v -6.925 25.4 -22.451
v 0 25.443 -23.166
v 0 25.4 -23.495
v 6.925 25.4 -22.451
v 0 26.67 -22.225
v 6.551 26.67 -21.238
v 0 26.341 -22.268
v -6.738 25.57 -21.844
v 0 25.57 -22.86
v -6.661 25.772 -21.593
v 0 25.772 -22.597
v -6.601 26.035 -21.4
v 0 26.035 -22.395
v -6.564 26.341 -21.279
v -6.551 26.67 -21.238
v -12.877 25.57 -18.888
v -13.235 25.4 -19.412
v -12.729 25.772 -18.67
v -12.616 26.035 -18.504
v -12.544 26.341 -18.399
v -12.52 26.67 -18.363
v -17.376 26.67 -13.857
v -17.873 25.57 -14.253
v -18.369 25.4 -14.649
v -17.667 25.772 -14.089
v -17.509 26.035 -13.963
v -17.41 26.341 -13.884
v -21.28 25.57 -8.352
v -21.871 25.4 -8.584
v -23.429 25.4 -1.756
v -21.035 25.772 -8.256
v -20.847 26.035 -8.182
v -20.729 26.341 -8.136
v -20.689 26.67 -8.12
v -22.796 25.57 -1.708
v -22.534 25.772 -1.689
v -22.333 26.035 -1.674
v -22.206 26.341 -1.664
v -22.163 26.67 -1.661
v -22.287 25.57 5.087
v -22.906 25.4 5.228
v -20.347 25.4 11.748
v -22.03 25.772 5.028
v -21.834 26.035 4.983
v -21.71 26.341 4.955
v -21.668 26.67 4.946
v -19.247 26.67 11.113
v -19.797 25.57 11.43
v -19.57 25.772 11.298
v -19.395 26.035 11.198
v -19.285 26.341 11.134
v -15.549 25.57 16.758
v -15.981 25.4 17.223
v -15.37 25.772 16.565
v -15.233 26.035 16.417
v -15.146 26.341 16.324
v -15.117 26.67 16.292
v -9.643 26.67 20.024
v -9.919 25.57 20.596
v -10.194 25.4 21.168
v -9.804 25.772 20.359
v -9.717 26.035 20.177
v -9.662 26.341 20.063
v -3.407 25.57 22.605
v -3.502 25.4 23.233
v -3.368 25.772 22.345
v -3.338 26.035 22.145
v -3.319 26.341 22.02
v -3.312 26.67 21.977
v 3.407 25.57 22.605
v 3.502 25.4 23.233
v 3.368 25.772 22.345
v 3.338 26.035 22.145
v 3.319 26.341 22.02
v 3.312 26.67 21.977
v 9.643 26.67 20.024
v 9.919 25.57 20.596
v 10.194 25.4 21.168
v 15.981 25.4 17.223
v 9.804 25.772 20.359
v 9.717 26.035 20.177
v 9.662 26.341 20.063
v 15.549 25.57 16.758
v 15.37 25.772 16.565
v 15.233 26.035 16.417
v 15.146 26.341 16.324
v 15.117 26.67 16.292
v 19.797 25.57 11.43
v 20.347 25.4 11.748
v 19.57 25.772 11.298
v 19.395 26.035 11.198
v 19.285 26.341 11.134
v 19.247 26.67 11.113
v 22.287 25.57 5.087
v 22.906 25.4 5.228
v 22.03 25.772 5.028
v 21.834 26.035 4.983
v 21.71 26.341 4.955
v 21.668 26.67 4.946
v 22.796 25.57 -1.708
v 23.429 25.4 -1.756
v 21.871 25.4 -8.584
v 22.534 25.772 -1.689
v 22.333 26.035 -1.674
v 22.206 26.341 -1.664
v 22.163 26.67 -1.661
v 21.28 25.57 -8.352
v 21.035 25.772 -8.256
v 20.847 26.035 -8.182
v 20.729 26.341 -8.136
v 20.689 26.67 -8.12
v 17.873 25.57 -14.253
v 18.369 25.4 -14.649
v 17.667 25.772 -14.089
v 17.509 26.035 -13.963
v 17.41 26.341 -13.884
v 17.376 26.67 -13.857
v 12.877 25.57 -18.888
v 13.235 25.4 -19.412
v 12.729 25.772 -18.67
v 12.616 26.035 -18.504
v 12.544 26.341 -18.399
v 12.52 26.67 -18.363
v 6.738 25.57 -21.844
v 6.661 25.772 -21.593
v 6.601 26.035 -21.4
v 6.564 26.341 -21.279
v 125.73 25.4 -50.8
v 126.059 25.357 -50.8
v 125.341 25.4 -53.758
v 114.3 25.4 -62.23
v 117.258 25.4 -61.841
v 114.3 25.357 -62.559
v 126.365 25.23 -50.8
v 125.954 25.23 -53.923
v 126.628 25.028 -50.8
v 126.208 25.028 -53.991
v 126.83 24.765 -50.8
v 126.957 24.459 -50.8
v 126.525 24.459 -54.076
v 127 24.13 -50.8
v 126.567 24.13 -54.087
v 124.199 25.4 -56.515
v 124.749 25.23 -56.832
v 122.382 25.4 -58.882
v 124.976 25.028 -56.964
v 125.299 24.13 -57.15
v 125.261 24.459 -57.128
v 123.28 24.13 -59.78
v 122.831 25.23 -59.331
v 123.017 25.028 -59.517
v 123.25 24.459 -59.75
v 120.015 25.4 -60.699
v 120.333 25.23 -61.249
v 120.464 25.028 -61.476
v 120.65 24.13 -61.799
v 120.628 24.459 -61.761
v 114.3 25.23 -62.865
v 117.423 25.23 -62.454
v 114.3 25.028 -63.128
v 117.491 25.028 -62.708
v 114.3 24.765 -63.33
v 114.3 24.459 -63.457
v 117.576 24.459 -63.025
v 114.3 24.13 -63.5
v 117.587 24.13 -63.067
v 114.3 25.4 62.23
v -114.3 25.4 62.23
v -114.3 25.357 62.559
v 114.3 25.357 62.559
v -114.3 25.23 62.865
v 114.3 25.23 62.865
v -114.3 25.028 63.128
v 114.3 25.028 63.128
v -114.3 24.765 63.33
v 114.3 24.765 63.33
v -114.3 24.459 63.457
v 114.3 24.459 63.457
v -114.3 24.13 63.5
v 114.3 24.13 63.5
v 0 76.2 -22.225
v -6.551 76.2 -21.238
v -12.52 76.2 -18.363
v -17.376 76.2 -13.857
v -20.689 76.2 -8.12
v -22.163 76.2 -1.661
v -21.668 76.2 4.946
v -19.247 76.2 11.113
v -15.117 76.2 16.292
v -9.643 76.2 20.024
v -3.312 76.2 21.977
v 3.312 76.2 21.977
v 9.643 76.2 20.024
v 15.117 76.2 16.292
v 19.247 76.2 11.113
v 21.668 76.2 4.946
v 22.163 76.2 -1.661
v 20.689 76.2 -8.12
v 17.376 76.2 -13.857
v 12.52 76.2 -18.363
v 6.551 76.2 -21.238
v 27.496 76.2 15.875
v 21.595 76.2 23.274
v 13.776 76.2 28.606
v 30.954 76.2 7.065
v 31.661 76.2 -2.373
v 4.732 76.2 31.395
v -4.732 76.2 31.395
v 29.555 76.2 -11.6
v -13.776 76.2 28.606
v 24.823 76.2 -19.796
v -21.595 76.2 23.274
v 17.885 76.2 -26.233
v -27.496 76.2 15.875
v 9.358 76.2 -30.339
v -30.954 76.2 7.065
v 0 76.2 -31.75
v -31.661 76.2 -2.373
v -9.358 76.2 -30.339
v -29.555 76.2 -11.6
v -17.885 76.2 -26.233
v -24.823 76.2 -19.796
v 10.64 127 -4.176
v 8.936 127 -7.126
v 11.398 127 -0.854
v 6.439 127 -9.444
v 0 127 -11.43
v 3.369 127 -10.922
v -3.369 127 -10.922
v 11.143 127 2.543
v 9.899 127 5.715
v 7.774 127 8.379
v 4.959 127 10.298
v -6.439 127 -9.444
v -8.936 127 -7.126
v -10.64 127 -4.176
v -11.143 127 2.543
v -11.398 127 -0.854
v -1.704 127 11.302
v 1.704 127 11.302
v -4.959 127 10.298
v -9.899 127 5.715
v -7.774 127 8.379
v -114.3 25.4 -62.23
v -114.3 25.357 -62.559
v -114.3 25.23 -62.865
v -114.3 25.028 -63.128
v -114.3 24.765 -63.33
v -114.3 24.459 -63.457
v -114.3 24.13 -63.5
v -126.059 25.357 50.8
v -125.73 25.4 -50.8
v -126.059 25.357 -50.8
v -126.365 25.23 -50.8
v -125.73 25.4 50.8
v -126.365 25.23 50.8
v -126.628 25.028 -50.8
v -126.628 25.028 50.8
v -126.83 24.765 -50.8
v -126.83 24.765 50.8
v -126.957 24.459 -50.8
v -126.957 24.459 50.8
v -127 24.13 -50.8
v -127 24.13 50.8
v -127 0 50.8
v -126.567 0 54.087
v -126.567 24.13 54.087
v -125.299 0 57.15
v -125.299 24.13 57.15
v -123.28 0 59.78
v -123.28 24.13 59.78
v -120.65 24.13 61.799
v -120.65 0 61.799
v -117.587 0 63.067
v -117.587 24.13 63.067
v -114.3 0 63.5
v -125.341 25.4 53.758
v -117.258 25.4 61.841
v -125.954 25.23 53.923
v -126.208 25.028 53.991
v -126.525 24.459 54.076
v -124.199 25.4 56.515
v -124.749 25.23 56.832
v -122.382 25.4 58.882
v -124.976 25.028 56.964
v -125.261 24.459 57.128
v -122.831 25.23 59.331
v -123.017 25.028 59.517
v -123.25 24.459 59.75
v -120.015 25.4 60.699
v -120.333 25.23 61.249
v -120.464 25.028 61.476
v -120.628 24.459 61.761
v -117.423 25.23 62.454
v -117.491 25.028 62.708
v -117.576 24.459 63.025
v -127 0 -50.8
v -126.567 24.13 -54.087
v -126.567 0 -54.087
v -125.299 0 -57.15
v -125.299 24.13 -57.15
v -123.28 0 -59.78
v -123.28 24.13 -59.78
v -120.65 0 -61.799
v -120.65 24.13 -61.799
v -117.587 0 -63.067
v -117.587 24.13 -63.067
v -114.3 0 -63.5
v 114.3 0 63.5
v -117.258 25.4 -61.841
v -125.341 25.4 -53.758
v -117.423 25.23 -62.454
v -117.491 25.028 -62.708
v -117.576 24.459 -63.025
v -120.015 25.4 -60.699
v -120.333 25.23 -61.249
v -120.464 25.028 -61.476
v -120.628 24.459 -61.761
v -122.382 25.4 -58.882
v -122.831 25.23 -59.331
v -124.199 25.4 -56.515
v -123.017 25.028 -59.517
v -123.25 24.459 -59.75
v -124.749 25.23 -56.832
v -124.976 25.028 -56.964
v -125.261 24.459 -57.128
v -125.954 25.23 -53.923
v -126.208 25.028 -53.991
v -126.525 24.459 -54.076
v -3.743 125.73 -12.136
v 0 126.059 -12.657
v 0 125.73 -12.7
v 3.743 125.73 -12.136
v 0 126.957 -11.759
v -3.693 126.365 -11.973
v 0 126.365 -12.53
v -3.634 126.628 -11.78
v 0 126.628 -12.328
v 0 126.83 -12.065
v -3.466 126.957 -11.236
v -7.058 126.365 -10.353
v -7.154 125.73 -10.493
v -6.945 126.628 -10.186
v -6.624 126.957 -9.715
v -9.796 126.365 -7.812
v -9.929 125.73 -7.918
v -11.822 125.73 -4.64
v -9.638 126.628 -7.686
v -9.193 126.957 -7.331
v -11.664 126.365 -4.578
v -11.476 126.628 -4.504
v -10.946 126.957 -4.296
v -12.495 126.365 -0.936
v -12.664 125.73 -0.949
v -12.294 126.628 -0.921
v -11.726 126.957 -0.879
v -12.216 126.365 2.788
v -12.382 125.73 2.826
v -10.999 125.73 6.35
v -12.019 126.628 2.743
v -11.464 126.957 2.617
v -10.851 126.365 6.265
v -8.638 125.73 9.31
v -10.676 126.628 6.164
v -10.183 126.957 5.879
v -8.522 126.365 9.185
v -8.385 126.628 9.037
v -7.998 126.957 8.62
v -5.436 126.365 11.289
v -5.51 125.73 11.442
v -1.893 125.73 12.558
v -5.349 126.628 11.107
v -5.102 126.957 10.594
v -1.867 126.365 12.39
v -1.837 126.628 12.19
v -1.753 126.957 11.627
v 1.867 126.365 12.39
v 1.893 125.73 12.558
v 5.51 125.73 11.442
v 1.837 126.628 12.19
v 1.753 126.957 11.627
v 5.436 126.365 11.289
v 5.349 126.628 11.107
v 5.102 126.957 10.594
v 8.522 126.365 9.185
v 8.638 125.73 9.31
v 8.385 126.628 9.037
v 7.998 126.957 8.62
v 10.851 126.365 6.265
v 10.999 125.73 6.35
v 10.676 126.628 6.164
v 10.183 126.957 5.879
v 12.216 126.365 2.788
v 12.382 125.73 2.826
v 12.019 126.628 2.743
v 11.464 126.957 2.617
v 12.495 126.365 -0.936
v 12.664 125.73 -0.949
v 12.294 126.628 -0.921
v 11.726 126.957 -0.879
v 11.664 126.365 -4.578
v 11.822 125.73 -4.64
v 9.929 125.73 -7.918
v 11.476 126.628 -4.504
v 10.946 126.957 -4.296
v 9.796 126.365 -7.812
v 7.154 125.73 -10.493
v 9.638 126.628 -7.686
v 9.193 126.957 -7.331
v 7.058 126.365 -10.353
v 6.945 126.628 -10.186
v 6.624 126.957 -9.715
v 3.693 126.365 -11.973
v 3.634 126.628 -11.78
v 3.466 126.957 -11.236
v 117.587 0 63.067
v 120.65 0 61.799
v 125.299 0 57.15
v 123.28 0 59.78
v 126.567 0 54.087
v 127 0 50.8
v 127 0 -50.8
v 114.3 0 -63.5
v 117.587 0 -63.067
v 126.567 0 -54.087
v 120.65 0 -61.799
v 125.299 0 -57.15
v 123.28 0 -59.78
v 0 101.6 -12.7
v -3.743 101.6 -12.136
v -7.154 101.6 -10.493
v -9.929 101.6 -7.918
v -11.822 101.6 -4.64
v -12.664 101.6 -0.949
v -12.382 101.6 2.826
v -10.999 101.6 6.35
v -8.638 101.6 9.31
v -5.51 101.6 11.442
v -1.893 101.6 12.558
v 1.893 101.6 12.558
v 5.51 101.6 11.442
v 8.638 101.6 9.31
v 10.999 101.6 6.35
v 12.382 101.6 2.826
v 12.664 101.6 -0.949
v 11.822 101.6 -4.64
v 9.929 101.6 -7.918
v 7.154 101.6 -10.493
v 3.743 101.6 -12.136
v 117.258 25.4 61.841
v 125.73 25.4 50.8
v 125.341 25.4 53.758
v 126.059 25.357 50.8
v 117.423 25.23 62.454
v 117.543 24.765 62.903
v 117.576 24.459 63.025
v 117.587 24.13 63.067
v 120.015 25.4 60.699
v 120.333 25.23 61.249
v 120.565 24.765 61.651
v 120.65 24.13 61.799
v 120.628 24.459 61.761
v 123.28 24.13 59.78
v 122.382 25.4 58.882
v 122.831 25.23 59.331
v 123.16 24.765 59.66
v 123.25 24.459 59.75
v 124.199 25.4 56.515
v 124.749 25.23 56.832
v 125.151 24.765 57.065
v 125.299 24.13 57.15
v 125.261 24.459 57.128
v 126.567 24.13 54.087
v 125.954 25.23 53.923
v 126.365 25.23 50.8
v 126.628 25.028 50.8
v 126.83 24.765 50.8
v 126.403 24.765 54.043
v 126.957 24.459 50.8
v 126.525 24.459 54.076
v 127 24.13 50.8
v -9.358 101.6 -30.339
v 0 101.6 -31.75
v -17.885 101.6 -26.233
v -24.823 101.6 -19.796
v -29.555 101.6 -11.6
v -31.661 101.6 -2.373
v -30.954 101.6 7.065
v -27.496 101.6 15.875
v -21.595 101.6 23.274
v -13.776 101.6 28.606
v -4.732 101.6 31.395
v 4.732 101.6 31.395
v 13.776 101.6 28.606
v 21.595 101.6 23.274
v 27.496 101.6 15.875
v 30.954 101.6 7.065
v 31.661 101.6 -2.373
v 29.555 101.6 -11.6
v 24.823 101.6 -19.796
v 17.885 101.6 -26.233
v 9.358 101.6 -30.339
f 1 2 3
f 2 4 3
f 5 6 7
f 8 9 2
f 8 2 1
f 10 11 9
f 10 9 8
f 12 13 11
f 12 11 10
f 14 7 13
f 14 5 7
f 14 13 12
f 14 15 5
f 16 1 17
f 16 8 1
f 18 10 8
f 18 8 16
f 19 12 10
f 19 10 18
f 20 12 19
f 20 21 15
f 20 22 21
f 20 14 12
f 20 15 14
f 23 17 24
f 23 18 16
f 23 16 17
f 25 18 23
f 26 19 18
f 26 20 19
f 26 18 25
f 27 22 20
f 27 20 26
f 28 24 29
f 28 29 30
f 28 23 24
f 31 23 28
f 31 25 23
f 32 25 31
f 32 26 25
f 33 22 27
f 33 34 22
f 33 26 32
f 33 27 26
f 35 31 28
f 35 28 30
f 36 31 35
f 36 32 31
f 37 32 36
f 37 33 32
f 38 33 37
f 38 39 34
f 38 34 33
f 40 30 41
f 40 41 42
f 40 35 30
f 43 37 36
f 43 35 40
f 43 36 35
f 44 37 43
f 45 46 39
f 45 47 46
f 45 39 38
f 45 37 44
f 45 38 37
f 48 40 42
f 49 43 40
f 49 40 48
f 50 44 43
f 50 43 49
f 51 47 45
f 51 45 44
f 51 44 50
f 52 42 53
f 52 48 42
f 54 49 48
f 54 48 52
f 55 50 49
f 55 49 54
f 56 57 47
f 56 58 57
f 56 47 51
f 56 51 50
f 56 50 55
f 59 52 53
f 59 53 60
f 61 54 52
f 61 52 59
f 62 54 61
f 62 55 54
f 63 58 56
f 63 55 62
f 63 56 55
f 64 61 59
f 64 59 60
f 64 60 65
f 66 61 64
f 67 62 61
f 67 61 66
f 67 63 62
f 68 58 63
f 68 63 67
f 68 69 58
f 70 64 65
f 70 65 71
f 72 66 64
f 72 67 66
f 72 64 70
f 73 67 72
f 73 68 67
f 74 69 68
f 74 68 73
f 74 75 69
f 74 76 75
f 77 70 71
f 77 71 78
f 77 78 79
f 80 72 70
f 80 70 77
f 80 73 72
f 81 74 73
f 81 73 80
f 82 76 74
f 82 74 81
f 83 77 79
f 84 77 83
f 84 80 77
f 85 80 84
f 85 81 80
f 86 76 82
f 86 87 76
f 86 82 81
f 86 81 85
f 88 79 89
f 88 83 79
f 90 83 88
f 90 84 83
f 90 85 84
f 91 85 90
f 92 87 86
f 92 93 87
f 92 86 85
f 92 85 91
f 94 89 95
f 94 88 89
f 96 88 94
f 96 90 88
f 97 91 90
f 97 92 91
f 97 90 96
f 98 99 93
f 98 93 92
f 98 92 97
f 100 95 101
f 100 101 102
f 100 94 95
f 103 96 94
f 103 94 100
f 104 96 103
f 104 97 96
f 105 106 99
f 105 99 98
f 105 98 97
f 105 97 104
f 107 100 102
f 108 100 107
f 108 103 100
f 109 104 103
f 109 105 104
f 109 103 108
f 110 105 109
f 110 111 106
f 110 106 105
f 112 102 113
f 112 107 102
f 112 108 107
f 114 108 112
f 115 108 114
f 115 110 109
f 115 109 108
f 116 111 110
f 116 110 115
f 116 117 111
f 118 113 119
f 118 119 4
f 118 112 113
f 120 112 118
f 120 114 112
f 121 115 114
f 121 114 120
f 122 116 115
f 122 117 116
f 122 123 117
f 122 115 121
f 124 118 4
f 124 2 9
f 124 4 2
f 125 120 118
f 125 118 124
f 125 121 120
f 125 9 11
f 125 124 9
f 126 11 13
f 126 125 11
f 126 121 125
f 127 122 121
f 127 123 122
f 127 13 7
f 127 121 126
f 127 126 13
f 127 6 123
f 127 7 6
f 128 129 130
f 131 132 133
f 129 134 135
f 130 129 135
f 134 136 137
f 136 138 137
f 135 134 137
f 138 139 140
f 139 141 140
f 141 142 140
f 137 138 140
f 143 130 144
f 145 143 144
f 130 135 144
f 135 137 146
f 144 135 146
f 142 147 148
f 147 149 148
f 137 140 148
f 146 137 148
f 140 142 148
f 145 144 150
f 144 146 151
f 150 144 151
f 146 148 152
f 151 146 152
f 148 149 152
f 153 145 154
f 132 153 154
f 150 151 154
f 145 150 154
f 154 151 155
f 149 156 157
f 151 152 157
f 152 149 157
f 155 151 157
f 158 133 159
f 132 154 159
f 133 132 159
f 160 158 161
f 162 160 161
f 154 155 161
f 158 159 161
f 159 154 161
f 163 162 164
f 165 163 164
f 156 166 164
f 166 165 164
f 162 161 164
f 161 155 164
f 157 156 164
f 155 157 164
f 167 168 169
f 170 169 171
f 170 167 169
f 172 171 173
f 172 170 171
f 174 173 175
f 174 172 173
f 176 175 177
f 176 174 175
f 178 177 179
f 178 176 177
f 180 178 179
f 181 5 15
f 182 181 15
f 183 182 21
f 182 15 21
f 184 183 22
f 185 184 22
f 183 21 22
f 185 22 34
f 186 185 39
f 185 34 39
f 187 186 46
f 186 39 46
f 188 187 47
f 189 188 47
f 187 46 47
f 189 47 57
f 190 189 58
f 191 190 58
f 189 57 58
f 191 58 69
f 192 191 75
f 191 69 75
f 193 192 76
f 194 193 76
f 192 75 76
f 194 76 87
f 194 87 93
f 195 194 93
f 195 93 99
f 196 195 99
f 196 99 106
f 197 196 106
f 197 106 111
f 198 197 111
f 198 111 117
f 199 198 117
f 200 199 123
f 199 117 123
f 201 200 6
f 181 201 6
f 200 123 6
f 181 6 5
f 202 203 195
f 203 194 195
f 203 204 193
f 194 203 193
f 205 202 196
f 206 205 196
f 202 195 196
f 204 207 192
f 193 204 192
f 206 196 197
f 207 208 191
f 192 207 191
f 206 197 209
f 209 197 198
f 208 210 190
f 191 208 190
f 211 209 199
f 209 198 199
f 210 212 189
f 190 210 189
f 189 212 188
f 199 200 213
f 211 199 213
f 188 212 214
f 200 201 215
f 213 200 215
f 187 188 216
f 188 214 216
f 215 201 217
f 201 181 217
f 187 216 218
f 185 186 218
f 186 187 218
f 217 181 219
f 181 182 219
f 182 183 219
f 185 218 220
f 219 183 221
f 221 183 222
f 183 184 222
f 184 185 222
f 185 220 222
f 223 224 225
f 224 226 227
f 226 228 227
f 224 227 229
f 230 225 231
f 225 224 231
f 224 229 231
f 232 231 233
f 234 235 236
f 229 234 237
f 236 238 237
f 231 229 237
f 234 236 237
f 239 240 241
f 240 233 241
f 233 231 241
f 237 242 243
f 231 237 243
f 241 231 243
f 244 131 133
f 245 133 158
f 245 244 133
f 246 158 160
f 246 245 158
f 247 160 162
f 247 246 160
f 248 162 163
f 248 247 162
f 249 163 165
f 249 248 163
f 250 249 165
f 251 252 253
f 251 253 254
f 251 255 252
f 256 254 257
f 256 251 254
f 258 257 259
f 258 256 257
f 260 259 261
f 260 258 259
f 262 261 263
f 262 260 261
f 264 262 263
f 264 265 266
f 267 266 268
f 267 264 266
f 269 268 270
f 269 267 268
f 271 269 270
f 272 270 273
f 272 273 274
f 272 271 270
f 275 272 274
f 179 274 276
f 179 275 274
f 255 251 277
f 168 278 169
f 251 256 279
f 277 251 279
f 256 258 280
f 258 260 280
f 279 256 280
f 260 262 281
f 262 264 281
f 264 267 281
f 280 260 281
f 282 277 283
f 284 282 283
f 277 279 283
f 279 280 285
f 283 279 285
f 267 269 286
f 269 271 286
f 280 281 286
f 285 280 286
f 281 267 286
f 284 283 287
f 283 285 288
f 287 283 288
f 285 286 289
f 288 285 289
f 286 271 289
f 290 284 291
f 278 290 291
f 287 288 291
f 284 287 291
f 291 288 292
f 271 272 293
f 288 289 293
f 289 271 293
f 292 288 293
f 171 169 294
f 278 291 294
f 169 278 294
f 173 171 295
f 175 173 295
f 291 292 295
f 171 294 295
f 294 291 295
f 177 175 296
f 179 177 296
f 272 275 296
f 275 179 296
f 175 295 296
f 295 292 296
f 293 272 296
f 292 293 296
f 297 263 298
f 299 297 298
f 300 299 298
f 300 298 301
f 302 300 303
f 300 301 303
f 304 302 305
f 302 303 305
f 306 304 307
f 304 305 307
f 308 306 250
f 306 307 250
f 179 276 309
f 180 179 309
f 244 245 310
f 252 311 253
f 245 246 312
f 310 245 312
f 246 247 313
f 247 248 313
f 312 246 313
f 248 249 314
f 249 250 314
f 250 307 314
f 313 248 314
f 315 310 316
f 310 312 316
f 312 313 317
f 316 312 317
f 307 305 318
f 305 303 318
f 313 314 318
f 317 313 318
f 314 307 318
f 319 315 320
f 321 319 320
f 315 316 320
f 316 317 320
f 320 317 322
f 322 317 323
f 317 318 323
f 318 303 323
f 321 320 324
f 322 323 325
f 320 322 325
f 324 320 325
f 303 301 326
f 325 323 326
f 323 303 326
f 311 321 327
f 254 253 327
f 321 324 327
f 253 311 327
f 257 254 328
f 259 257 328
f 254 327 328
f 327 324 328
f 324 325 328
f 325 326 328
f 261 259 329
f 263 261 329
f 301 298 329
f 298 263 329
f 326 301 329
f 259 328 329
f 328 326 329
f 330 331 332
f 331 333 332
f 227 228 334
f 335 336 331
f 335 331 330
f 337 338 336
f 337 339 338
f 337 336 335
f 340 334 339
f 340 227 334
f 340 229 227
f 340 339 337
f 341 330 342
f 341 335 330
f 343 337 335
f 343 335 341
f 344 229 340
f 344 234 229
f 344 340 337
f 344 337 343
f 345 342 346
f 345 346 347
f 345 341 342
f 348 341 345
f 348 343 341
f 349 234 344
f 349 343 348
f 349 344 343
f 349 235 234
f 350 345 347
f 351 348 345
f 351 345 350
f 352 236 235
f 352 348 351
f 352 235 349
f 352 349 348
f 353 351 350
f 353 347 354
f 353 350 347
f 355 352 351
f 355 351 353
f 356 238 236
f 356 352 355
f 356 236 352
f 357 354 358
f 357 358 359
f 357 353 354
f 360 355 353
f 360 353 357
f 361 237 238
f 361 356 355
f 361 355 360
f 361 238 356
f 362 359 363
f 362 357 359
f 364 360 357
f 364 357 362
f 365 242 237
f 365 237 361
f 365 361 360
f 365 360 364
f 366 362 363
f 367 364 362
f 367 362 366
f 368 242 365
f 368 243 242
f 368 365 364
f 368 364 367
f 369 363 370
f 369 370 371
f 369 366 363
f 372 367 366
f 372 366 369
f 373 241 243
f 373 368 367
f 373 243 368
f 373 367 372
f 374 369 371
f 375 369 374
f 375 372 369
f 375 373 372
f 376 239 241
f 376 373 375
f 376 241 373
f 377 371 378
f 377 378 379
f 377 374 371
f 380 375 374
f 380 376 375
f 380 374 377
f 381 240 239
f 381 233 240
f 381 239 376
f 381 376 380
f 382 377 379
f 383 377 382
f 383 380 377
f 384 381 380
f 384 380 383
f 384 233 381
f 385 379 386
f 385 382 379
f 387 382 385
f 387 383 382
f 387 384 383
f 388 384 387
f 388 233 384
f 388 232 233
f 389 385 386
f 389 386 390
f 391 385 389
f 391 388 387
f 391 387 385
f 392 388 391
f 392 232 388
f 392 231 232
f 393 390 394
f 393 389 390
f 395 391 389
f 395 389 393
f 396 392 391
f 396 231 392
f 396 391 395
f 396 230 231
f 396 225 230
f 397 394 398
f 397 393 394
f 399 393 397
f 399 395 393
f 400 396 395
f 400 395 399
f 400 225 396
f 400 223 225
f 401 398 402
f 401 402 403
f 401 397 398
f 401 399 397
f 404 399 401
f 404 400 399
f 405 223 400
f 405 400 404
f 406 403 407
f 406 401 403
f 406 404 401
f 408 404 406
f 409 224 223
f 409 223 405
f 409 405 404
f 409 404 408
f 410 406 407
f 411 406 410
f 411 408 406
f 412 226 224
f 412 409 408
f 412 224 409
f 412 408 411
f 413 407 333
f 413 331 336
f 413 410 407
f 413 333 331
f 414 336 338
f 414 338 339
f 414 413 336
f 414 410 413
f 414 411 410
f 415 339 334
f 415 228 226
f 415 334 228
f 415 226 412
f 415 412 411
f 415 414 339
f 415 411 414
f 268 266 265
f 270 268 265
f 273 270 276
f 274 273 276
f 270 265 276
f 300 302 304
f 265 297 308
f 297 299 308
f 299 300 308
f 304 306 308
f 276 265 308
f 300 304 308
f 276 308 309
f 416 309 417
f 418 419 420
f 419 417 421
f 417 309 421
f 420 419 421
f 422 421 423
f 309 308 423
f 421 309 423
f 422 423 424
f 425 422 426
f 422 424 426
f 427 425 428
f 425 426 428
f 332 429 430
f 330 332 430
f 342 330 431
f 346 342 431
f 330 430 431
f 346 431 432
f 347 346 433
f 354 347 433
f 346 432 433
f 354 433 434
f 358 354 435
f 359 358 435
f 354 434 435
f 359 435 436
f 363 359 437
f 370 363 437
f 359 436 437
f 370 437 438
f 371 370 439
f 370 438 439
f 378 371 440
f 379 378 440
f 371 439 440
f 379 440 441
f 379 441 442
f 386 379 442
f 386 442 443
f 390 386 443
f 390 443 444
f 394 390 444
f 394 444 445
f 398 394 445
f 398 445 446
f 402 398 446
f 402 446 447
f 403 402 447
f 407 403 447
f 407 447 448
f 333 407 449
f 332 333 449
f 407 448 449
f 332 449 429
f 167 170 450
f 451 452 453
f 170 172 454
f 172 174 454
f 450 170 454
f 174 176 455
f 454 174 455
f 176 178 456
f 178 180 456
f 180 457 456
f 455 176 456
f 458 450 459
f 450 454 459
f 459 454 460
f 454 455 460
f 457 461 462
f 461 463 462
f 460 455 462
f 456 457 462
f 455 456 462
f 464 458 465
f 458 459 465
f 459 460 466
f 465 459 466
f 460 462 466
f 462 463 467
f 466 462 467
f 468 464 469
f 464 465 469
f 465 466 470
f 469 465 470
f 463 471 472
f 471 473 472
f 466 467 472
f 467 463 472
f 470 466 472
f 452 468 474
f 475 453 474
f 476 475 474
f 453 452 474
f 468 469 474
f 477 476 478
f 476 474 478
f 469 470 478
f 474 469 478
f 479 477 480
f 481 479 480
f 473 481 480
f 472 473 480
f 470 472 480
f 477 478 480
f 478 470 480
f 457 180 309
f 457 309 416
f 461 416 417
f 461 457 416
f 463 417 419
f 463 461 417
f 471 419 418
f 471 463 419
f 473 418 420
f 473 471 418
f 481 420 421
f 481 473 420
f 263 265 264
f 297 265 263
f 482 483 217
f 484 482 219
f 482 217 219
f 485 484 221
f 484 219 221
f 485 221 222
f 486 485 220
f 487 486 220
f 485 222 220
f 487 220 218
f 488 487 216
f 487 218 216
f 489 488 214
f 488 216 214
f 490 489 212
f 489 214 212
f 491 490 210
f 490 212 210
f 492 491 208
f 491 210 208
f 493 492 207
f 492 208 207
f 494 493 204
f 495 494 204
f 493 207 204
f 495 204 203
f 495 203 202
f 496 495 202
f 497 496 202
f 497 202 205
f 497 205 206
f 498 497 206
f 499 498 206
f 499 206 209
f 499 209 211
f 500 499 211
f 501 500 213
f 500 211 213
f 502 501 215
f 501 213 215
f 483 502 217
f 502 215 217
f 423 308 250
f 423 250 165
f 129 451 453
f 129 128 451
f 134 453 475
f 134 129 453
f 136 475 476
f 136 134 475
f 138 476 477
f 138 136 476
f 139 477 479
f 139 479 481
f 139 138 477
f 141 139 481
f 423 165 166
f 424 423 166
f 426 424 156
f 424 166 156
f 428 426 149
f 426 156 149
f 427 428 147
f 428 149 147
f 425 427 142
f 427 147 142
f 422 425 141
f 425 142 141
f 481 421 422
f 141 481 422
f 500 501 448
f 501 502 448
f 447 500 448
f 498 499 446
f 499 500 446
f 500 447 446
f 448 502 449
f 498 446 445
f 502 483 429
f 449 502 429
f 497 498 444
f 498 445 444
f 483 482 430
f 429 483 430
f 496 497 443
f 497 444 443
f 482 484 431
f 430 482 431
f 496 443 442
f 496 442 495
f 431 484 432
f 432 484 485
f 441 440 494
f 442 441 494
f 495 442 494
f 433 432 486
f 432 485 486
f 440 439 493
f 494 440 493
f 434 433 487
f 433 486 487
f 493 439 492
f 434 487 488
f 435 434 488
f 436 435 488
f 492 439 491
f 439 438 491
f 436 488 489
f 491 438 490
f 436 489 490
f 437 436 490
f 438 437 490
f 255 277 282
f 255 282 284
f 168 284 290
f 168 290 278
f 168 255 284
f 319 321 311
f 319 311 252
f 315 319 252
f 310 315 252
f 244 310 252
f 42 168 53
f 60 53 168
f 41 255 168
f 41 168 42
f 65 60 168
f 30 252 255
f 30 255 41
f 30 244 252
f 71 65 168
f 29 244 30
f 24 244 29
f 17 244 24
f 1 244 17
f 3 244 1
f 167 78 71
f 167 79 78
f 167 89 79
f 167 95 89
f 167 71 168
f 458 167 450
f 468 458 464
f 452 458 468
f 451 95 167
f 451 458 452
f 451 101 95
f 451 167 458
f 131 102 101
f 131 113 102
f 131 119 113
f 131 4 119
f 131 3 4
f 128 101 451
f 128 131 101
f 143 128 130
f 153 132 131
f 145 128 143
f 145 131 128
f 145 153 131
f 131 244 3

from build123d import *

# Parameters (mm, degrees)
SKETCH1_W      = 254
SKETCH1_H      = 127
EXTRUDE1_DEPTH = 25.4
FILLET1_R      = 12.7
FILLET2_R      = 1.27


with BuildPart() as part:
    # Sketch1 → Extrude1 (new body)
    with BuildSketch(Plane(origin=(0, 0, 0), x_dir=(1, 0, 0), z_dir=(0, 1, 0))):
        Rectangle(SKETCH1_W, SKETCH1_H)
    extrude(amount=EXTRUDE1_DEPTH)

    # Sketch3 → Revolve1 (revolve)
    with BuildSketch(Plane.XY, mode=Mode.PRIVATE) as revolve1_sk:
        Polygon((0, 127), (12.7, 127), (12.7, 101.6), (31.75, 101.6), (31.75, 76.2), (22.225, 76.2), (22.225, 25.4), (0, 25.4), align=None)
    revolve(revolve1_sk.sketch.rotate(Axis((0, 0, 0), (0, 1, 0)), 90), axis=Axis((0, 0, 0), (0, 1, 0)))

    # Fillet1
    fillet1_edges = [part.edges().sort_by_distance(p)[0] for p in [
        (-127, 12.7, -63.5),
        (127, 12.7, -63.5),
        (127, 12.7, 63.5),
        (-127, 12.7, 63.5),
    ]]
    fillet(fillet1_edges, radius=FILLET1_R)

    # Fillet2
    fillet2_edges = [part.edges().sort_by_distance(p)[0] for p in [
        (0, 25.4, 22.225),
        (0, 127, 12.7),
        (127, 25.4, 0),
        (0, 25.4, 63.5),
        (-127, 25.4, 0),
        (0, 25.4, -63.5),
        (-123.280256121, 25.4, 59.780256121),
        (-123.280256121, 25.4, -59.780256121),
        (123.280256121, 25.4, -59.780256121),
        (123.280256121, 25.4, 59.780256121),
    ]]
    fillet(fillet2_edges, radius=FILLET2_R)


solid = part.part
